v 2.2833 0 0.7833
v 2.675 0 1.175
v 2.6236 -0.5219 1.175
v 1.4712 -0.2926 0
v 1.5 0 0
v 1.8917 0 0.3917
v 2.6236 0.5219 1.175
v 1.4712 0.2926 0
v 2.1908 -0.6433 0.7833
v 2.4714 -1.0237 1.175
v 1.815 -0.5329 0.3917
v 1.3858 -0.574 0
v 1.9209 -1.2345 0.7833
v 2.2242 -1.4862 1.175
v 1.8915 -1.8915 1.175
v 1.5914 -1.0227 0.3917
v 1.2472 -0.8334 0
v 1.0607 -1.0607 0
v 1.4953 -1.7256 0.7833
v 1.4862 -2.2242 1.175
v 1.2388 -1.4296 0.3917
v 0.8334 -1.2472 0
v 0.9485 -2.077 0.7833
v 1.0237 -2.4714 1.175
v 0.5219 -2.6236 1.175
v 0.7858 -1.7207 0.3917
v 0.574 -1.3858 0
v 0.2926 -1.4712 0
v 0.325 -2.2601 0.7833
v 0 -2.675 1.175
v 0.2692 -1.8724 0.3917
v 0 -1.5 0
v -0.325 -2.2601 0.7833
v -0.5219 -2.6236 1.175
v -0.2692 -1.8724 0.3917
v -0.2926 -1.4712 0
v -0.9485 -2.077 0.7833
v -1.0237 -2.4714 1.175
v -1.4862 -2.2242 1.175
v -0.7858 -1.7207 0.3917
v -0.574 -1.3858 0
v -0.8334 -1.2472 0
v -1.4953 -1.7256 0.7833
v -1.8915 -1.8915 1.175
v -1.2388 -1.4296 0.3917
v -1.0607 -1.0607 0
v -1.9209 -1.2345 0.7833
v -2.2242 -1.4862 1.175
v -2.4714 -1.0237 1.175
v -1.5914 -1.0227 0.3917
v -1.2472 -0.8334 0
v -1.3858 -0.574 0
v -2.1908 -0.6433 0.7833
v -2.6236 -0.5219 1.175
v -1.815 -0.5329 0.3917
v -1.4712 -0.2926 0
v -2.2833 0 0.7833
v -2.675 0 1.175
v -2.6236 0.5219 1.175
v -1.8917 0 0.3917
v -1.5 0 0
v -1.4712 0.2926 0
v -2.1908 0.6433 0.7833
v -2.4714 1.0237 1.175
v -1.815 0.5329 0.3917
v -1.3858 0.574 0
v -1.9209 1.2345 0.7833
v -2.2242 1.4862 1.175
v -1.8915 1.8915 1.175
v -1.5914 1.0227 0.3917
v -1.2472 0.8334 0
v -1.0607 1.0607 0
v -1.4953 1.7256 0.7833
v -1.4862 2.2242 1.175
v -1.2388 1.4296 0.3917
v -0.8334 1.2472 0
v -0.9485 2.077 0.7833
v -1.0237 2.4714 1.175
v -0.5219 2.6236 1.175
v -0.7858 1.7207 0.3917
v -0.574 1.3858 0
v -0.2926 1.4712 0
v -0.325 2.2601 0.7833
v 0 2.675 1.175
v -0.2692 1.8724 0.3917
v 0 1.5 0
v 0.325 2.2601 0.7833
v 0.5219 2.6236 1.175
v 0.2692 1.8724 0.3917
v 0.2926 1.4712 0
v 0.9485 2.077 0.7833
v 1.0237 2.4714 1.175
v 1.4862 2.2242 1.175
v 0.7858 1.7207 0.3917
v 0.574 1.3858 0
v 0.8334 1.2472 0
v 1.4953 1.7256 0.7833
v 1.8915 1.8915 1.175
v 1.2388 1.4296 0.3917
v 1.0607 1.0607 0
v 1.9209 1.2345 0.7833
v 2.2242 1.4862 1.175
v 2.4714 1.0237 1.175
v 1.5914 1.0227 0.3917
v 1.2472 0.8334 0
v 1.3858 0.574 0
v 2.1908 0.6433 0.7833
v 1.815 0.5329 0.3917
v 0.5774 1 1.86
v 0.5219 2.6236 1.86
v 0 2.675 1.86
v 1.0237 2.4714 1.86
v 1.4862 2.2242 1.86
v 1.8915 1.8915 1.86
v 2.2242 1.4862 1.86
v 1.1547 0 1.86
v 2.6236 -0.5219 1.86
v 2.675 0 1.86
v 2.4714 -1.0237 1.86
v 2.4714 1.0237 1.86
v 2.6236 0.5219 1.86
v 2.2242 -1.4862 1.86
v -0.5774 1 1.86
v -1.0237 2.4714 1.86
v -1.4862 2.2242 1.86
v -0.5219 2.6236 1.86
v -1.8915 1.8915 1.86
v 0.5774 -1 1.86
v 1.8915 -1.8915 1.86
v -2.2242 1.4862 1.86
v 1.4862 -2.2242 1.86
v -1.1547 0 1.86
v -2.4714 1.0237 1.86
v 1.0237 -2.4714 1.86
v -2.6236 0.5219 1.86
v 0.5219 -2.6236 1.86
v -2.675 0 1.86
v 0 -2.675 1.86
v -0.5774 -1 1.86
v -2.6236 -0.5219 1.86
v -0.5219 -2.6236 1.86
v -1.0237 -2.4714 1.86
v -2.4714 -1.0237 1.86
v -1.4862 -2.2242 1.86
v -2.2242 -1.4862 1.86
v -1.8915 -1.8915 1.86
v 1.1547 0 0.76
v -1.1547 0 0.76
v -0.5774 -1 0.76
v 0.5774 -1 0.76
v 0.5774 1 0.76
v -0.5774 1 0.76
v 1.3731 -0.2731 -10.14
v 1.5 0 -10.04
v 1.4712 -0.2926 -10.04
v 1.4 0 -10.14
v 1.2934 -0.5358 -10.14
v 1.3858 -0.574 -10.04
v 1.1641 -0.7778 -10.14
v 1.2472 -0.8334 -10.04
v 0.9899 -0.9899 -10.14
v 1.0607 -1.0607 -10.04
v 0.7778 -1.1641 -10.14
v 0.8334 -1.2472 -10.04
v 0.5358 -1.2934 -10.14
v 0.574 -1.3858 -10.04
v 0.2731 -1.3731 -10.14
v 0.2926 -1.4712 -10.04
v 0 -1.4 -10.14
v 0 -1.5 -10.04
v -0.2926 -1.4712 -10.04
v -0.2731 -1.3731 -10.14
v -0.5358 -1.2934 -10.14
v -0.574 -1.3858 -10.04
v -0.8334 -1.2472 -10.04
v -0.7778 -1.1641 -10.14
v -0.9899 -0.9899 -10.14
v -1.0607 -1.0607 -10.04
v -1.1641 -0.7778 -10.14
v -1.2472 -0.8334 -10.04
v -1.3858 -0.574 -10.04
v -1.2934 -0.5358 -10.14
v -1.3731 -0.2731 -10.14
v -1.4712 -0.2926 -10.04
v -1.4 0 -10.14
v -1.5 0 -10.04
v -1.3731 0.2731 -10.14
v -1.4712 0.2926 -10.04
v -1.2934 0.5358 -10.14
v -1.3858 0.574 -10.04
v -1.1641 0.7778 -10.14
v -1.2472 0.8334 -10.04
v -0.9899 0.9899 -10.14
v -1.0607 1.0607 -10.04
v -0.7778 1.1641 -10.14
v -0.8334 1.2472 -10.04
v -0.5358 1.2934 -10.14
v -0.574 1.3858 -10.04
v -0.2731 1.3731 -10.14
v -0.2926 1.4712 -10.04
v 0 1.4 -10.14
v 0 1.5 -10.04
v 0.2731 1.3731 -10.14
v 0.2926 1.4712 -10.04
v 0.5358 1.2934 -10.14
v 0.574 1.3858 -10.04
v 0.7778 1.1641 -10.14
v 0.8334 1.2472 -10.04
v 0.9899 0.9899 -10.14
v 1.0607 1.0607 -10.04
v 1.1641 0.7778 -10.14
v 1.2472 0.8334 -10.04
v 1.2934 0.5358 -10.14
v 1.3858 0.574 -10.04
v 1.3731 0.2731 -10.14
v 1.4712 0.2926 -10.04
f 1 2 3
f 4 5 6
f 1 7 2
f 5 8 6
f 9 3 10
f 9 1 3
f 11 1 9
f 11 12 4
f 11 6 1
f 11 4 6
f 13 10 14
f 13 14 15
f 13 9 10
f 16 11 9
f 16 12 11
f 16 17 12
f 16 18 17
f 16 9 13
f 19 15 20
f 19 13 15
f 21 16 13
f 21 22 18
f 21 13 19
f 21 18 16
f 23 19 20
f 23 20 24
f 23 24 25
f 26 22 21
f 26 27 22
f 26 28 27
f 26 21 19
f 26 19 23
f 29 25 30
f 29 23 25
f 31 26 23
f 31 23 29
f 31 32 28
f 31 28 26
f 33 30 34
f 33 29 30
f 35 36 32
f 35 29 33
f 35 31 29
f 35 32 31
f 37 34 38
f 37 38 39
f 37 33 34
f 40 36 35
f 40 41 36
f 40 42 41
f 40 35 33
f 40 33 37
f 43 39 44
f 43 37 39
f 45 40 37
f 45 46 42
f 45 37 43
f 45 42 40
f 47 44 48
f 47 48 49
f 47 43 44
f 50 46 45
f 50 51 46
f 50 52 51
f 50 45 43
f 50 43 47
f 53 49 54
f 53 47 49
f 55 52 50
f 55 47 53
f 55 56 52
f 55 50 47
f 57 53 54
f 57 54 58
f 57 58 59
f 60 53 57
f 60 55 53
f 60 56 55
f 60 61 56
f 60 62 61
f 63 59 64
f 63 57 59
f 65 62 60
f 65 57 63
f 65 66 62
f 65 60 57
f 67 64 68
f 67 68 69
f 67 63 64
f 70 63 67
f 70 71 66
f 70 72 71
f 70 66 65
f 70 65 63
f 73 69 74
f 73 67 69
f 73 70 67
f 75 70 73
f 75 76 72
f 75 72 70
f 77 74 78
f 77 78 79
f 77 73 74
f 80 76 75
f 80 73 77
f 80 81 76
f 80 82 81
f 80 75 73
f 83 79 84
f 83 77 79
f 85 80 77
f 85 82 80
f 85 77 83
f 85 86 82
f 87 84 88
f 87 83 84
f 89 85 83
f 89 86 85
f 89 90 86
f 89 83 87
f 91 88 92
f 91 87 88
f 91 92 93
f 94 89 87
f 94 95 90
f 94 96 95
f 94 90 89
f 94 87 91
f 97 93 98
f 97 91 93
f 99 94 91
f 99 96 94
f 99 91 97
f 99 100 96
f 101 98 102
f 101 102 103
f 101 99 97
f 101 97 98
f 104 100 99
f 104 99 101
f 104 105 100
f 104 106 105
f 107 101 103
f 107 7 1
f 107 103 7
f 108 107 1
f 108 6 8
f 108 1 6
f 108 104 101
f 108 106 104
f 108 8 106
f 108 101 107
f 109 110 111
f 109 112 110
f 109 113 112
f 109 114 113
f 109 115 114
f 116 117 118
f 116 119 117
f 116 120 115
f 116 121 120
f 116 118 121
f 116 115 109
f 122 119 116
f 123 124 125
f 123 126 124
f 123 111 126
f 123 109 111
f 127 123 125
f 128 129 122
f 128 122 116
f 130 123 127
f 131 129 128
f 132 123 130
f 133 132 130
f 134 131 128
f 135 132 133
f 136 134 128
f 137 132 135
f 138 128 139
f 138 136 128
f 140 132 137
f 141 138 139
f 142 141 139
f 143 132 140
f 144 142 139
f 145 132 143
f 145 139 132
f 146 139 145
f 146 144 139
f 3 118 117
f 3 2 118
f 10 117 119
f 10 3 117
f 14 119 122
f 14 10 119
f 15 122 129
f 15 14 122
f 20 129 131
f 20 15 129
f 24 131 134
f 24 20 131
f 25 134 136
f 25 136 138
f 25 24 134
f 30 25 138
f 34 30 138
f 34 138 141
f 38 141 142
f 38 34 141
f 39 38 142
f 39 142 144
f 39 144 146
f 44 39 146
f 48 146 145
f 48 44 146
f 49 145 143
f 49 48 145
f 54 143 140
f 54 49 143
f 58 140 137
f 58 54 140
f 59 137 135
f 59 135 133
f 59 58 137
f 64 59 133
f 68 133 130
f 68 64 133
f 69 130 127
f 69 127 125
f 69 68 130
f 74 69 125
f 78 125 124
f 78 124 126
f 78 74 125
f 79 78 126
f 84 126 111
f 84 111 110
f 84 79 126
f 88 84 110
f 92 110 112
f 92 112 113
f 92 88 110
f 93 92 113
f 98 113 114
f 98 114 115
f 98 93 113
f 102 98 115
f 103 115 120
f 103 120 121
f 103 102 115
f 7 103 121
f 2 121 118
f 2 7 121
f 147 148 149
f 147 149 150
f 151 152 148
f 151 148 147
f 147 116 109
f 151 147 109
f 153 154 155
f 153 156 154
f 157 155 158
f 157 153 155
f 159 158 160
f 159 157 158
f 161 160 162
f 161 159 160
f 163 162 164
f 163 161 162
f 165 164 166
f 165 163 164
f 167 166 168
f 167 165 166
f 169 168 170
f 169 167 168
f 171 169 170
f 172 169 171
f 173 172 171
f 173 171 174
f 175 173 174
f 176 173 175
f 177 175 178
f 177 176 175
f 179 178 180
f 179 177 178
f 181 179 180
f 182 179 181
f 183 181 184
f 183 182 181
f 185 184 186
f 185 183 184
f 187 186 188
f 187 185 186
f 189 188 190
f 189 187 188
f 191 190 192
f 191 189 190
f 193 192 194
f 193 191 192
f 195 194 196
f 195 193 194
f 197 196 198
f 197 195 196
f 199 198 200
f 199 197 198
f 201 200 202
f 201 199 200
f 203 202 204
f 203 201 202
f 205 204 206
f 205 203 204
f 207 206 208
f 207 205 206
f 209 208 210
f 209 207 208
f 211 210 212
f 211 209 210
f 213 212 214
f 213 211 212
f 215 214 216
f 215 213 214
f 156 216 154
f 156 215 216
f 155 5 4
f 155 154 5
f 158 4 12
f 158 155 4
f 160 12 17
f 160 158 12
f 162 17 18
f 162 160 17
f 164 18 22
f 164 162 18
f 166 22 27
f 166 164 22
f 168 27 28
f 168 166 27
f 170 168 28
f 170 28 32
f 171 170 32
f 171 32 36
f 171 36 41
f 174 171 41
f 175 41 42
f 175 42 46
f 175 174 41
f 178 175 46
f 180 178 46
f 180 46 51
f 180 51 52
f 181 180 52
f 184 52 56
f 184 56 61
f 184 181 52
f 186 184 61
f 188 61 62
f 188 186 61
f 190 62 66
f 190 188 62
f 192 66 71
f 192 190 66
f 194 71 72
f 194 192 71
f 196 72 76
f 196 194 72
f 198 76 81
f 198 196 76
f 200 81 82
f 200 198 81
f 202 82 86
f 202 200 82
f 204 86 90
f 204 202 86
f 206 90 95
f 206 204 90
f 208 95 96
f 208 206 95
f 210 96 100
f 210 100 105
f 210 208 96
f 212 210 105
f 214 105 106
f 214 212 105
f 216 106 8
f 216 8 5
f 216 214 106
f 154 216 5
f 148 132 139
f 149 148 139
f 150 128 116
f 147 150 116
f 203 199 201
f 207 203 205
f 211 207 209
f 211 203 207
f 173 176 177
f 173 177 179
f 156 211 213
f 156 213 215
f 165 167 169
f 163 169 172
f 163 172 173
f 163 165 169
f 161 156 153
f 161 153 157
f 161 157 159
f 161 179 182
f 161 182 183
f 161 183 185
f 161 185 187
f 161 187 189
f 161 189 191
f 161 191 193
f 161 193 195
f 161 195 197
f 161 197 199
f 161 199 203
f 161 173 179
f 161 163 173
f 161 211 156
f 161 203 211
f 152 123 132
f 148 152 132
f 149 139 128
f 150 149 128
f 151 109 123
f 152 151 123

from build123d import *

# Parameters (mm, degrees)
HEX_CUT_DEPTH = 1.1


with BuildPart() as part:
    # Body_Sketch → Body_Revolve (revolve)
    with BuildSketch(Plane(origin=(0, 0, 0), x_dir=(0, 0, -1), z_dir=(1, 0, 0))):
        Polygon((0, 1.5), (10.04, 1.5), (10.14, 1.4), (10.14, 0), (-1.86, 0), (-1.86, 2.675), (-1.175, 2.675), align=None)
    revolve(axis=Axis((0, 0, 0), (0, 0, -1)))

    # Key_Sketch → Hex_Cut (cut)
    with BuildSketch(Plane.XY.offset(1.86)):
        Polygon((1.154700538, 0), (0.577350269, 1), (-0.577350269, 1), (-1.154700538, 0), (-0.577350269, -1), (0.577350269, -1), align=None)
    extrude(amount=-HEX_CUT_DEPTH, mode=Mode.SUBTRACT)


solid = part.part
